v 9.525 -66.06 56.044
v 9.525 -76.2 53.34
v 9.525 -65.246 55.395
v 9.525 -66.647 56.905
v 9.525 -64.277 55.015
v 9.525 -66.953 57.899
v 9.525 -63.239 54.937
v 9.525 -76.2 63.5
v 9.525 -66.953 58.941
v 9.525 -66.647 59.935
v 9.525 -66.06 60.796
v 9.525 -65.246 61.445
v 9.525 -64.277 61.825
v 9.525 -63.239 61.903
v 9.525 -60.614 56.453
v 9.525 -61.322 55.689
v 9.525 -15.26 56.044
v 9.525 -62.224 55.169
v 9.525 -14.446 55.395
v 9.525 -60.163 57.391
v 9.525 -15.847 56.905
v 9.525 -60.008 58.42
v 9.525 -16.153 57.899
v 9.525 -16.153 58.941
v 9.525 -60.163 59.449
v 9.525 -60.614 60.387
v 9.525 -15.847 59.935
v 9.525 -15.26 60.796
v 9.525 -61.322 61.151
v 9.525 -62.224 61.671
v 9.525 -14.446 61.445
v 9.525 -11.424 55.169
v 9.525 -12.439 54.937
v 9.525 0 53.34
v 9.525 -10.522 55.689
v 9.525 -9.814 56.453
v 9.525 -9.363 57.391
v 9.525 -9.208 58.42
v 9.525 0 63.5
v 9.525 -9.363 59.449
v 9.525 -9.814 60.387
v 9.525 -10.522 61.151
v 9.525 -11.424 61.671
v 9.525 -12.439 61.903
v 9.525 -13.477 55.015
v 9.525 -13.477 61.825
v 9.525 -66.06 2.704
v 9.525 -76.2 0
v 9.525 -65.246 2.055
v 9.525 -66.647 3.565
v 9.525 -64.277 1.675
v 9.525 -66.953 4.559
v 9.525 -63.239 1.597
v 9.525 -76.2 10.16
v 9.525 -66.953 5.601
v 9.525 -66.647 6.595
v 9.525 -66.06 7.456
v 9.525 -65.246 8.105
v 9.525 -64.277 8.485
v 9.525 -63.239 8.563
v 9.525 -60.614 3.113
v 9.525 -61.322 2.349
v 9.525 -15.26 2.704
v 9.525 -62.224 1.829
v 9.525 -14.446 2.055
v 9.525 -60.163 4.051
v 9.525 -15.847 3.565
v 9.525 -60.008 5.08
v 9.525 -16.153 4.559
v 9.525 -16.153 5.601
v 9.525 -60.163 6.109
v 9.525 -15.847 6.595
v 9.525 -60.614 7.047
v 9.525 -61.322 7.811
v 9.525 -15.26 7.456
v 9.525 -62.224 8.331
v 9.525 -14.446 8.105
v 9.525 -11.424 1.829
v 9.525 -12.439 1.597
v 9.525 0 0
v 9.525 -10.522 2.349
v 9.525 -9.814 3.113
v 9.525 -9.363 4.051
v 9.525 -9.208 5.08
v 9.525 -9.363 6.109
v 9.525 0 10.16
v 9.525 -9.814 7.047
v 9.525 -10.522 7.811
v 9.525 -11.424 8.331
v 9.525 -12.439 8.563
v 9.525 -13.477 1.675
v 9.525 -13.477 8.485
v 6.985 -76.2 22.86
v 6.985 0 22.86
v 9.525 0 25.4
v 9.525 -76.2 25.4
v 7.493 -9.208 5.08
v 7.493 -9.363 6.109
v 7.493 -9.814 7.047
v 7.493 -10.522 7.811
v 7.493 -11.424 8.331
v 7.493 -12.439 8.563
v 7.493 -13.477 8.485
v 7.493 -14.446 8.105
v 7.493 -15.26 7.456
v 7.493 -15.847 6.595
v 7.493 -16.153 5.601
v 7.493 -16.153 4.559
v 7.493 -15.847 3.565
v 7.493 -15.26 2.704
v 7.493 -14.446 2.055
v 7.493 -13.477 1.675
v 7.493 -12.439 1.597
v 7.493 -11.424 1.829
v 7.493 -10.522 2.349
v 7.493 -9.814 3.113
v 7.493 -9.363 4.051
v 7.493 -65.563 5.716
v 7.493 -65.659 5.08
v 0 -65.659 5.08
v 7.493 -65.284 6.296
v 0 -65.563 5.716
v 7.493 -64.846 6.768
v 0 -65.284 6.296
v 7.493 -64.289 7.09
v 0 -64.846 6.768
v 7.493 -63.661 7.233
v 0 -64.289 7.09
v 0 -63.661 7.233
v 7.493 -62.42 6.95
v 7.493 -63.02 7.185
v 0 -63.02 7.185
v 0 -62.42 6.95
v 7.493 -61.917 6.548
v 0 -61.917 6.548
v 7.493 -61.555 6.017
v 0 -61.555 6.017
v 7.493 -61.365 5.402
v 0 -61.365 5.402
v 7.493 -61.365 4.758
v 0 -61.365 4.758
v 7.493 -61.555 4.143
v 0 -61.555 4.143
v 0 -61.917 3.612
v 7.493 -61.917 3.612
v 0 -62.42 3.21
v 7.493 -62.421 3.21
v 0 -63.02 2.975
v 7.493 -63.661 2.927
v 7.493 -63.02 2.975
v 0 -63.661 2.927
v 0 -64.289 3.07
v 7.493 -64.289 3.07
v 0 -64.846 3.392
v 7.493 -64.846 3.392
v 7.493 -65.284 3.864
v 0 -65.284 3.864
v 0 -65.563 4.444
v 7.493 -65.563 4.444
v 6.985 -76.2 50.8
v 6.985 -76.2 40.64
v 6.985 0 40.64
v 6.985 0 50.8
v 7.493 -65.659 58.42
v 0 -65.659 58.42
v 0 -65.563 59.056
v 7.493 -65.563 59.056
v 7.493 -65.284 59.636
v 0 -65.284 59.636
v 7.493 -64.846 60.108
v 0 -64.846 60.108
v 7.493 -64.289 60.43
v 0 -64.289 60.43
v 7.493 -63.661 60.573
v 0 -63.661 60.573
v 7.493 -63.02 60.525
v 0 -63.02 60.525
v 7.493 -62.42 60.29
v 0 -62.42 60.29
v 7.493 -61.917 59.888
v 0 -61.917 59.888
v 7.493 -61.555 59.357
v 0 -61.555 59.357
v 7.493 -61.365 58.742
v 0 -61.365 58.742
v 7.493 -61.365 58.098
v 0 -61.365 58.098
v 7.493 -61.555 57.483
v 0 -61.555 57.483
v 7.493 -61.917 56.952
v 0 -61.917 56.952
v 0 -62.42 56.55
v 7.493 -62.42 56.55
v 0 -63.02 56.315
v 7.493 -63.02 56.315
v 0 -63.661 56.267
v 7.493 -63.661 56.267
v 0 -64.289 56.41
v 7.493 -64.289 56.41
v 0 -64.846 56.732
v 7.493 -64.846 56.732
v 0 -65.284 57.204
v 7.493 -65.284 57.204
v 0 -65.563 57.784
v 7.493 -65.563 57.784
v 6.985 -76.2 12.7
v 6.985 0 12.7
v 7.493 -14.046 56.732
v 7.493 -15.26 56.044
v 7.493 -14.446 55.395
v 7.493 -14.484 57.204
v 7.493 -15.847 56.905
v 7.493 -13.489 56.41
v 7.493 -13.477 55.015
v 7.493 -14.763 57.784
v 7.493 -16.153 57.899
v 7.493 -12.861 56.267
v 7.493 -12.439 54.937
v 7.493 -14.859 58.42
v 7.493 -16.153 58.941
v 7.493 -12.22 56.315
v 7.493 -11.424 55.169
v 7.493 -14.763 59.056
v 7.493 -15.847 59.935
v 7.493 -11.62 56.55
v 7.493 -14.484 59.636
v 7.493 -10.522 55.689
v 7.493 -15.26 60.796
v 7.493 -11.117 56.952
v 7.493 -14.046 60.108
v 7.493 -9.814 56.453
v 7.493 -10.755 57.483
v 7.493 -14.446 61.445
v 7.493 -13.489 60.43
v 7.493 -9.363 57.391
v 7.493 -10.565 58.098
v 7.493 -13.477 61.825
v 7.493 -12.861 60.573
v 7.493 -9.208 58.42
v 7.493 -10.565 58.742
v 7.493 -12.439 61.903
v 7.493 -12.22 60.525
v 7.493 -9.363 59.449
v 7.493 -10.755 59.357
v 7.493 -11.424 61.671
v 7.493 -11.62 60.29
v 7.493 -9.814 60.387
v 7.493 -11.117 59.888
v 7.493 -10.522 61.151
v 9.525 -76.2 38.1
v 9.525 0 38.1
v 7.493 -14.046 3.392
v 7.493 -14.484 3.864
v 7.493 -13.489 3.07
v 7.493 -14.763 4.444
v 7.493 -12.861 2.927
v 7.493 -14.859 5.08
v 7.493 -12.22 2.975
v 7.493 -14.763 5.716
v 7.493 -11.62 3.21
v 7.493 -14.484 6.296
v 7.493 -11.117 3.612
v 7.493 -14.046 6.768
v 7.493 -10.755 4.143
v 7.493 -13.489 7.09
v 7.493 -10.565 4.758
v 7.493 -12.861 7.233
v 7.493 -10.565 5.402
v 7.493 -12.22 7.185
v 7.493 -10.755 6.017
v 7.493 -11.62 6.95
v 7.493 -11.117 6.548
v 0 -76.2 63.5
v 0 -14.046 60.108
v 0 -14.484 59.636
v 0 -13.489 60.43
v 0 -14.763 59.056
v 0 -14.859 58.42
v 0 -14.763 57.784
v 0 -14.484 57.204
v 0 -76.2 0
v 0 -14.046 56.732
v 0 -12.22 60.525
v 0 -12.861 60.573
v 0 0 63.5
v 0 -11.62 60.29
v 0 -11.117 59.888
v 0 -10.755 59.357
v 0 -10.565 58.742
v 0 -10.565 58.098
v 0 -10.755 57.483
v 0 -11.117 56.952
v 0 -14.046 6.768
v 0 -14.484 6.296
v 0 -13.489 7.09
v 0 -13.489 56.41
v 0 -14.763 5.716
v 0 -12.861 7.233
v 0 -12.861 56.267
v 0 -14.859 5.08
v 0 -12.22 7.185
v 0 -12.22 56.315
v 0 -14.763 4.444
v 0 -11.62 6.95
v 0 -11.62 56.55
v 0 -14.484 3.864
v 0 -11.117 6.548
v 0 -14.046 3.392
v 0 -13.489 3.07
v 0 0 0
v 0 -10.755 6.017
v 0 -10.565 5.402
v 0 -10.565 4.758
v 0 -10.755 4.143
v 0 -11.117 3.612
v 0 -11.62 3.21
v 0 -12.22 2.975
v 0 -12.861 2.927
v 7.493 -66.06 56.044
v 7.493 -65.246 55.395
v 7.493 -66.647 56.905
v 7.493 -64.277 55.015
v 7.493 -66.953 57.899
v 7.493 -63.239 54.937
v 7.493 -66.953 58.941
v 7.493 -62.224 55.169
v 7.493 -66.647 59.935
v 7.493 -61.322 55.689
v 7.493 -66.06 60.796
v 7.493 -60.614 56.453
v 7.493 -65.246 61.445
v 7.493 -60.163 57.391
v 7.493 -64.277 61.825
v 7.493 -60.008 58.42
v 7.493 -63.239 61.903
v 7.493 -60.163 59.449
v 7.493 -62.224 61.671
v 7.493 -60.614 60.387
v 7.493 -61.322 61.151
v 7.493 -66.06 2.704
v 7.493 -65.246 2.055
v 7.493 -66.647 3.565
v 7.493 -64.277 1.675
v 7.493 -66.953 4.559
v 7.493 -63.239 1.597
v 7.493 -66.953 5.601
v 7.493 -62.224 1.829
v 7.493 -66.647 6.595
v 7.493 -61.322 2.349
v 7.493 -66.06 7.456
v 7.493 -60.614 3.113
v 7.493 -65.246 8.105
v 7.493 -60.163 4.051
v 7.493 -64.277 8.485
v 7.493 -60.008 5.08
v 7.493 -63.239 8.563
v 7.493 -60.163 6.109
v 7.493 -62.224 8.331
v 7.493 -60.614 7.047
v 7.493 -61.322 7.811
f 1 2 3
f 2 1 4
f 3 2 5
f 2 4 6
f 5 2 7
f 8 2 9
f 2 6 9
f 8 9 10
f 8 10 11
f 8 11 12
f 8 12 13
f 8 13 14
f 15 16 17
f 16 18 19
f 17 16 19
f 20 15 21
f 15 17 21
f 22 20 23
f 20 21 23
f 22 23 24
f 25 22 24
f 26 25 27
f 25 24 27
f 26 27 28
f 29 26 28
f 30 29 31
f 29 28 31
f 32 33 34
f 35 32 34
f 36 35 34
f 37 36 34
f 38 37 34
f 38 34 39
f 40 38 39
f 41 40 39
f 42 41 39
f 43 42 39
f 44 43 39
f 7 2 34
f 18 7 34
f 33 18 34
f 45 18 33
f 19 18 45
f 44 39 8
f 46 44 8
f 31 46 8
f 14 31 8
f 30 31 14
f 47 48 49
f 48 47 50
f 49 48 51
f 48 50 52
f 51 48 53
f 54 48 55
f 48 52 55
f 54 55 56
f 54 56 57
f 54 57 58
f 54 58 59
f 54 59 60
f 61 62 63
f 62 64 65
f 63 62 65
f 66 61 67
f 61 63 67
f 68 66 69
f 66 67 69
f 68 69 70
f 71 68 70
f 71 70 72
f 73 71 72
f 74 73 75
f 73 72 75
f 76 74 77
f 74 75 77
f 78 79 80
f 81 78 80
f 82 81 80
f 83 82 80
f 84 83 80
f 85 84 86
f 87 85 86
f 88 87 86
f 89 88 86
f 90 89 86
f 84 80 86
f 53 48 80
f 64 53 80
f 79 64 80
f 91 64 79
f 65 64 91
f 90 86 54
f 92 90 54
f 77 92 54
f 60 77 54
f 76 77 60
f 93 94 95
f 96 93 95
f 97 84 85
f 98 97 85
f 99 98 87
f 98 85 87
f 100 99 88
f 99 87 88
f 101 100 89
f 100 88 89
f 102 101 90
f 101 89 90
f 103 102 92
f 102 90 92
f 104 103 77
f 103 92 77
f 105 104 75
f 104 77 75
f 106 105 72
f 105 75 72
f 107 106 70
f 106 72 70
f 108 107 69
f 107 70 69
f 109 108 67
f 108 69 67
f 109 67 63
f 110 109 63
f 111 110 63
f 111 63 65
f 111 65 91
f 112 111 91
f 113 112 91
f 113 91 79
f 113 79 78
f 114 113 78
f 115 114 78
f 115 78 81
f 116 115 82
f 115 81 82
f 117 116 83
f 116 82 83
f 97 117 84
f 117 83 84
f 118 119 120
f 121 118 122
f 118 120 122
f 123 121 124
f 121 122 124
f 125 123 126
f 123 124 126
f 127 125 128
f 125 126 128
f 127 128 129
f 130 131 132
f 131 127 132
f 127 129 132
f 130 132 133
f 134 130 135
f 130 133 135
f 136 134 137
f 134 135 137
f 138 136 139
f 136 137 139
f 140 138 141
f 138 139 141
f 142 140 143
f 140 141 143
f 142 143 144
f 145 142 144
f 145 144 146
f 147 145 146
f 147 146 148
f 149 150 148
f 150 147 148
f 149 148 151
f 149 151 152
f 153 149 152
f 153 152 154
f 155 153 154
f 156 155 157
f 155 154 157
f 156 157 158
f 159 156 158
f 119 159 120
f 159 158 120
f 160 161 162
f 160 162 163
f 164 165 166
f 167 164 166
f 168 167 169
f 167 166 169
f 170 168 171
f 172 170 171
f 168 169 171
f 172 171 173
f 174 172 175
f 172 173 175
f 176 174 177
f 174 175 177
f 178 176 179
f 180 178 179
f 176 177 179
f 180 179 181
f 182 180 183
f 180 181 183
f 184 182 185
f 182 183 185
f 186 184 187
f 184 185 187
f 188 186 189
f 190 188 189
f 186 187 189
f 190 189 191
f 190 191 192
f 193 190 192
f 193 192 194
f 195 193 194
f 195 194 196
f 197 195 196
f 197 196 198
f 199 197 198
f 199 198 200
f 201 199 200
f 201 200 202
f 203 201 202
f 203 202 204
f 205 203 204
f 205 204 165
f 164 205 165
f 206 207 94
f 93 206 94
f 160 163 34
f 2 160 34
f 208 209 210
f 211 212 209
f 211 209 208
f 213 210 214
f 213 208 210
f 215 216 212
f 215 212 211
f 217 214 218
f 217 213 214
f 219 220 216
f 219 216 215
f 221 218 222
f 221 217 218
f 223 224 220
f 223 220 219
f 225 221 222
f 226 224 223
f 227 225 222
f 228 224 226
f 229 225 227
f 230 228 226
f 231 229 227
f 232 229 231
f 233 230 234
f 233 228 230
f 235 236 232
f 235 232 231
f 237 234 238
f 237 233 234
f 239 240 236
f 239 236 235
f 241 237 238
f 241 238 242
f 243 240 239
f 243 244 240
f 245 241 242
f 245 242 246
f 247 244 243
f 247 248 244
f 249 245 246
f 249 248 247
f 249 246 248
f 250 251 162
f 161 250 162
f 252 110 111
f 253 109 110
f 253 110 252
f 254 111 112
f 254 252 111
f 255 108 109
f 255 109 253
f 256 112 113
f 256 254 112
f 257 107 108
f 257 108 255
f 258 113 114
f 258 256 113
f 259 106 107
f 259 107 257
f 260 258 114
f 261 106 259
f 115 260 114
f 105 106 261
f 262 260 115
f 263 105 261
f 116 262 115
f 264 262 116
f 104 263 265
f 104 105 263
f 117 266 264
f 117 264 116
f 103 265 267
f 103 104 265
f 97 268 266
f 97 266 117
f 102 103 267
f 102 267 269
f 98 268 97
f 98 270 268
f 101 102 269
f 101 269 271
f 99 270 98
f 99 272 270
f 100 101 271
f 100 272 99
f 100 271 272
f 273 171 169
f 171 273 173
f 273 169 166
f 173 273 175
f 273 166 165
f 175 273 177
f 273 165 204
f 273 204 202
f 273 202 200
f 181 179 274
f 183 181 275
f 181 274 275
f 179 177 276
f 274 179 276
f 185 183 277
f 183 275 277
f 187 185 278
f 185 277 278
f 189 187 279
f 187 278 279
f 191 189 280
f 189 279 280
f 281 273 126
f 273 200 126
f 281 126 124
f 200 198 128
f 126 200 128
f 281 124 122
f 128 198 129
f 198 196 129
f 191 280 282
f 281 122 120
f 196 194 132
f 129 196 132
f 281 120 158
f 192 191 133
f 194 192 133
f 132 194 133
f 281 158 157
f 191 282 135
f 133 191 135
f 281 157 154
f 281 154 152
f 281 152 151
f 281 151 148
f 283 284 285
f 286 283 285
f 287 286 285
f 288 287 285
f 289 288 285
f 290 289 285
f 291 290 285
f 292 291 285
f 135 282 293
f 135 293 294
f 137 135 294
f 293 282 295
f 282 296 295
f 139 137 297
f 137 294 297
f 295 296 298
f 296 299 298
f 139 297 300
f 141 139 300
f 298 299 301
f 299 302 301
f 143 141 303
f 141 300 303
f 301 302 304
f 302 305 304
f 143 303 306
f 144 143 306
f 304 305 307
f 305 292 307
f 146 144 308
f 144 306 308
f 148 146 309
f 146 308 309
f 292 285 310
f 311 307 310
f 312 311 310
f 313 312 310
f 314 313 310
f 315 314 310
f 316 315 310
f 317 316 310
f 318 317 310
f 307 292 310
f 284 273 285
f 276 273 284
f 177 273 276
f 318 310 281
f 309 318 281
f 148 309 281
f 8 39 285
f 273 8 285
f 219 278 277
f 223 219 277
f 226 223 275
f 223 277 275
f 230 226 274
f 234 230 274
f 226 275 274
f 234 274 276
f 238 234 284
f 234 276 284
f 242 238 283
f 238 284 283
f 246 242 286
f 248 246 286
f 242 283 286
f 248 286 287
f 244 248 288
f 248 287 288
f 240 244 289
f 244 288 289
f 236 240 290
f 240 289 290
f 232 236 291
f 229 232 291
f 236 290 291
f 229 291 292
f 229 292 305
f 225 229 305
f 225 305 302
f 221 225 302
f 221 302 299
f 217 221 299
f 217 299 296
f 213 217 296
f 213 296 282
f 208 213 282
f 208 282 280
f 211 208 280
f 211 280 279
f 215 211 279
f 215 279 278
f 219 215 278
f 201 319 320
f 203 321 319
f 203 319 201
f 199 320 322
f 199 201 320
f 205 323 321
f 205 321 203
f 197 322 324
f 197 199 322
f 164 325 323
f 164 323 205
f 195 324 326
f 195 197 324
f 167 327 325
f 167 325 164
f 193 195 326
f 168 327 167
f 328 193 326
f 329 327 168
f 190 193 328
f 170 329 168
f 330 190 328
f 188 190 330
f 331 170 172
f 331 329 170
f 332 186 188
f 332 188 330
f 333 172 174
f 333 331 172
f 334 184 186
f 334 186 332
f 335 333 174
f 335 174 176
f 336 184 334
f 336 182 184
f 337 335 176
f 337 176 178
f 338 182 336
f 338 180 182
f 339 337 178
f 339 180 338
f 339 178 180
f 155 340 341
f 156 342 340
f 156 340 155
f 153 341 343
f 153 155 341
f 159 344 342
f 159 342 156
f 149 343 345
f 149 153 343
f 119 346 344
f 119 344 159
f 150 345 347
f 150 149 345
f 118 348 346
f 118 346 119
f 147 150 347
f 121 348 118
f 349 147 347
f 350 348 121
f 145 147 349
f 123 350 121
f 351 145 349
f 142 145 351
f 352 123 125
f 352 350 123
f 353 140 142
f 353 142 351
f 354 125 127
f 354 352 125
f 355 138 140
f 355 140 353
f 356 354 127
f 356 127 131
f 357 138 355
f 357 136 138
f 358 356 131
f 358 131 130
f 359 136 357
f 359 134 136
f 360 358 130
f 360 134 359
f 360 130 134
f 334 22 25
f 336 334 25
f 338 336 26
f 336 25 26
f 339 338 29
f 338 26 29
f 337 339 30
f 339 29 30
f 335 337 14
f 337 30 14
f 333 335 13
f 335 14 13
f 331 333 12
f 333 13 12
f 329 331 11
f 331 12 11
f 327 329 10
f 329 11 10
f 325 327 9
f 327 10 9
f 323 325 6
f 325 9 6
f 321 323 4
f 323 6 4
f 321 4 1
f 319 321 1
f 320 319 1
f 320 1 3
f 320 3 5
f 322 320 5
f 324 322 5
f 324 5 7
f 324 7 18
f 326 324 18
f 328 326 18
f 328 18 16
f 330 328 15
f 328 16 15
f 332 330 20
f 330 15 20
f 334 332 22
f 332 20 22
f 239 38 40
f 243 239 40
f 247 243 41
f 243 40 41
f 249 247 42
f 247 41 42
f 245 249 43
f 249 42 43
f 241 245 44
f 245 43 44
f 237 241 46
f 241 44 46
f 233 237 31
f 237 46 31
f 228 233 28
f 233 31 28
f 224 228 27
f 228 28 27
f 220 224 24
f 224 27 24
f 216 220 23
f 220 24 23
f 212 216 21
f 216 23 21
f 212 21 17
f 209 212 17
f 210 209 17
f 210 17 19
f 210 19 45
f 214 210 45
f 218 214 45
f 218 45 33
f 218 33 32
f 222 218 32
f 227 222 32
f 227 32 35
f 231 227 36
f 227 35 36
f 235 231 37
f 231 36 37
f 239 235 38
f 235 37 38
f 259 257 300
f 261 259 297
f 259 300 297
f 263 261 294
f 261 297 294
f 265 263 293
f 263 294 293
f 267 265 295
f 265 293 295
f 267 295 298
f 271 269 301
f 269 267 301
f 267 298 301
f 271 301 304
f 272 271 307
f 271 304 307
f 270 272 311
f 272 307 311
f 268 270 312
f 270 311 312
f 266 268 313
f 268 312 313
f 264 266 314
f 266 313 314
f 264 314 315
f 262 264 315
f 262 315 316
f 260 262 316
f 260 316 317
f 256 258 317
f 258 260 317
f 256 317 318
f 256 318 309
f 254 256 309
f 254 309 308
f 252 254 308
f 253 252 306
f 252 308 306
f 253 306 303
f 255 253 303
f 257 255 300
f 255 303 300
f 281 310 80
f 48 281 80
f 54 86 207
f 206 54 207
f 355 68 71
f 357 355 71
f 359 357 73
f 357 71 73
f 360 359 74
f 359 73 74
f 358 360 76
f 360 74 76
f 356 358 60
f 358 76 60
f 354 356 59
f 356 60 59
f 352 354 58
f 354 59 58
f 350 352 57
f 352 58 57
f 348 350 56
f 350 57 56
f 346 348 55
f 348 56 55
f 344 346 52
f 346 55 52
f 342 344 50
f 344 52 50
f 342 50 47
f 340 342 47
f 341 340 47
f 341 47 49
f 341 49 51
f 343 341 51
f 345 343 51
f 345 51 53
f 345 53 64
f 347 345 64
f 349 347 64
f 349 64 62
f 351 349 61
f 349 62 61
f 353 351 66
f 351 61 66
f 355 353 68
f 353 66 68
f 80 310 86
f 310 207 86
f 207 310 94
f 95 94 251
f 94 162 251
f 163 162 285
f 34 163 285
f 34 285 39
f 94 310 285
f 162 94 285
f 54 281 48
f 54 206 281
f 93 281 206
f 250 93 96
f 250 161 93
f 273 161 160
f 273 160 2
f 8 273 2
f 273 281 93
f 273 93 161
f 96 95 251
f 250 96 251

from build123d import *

# Parameters (mm, degrees)
F1_DEPTH = 76.2
F4_D     = 4.318
F4_DEPTH = 12.7
F4_TIP   = 1.2972580765
F5_R     = 3.4925
F5_R_2   = 2.159
F6_DEPTH = 2.032


with BuildPart() as f1:
    # F0 (on Front) → F1 (new body)
    with BuildSketch(Plane.XZ):
        Polygon((0, 63.5), (0, 0), (9.525, 0), (9.525, 10.16), (6.985, 12.7), (6.985, 22.86), (9.525, 25.4), (9.525, 38.1), (6.985, 40.64), (6.985, 50.8), (9.525, 53.34), (9.525, 63.5), align=None)
    extrude(amount=F1_DEPTH)

    # F4
    with Locations(Plane.YZ.offset(9.525)):
        with Locations((-63.5, 58.42), (-12.7, 58.42), (-63.5, 5.08), (-12.7, 5.08)):
            Hole(F4_D / 2, depth=F4_DEPTH)
            with Locations((0, 0, -(F4_DEPTH + F4_TIP / 2))):  # 118° drill point
                Cone(0, F4_D / 2, F4_TIP, mode=Mode.SUBTRACT)

    # F5 (on face) → F6 (cut)
    with BuildSketch(Plane.YZ.offset(9.525)):
        with Locations((-63.5, 58.42)):
            Circle(F5_R)
        with Locations((-12.7, 58.42)):
            Circle(F5_R)
        with Locations((-63.5, 5.08)):
            Circle(F5_R)
        with Locations((-63.5, 5.08)):
            Circle(F5_R_2, mode=Mode.SUBTRACT)
        with Locations((-12.7, 5.08)):
            Circle(F5_R)
        with Locations((-12.7, 5.08)):
            Circle(F5_R_2, mode=Mode.SUBTRACT)
    extrude(amount=-F6_DEPTH, mode=Mode.SUBTRACT)


solid = f1.part
